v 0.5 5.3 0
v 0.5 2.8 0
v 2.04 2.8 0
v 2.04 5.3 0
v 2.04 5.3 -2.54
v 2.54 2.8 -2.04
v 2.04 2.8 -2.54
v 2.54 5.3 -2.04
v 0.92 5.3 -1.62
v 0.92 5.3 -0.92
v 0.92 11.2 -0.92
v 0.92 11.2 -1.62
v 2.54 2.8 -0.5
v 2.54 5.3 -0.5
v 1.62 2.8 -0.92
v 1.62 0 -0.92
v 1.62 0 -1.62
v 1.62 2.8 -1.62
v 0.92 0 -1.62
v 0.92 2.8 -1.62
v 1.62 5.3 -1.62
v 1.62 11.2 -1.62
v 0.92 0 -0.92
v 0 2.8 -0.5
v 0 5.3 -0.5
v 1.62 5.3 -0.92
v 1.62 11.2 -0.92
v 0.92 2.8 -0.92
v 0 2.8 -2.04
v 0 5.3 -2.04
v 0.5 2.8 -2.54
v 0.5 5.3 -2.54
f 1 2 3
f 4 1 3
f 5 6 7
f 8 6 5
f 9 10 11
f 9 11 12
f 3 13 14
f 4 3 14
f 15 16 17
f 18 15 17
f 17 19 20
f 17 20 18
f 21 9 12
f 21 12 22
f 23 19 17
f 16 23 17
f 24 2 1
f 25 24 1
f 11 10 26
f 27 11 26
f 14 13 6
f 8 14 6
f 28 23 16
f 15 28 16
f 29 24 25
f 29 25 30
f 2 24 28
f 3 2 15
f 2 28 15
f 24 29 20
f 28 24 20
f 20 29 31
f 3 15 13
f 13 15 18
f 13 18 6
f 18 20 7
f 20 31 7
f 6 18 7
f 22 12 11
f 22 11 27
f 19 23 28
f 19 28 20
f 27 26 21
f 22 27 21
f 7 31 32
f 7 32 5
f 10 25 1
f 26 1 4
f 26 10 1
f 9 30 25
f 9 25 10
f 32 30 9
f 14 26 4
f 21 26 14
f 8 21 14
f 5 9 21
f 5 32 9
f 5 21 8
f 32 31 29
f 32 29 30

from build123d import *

# Parameters (mm, degrees)
SKETCH1_W           = 0.7
SKETCH1_H           = 0.7
BOSS_EXTRUDE1_DEPTH = 11.2
BOSS_EXTRUDE2_START = 2.8
SKETCH1_3_W         = 2.54
SKETCH1_3_H         = 2.54
SKETCH1_3_W_2       = 0.7
SKETCH1_3_H_2       = 0.7
BOSS_EXTRUDE2_DEPTH = 2.5
CHAMFER1_SIZE       = 0.5


with BuildPart() as part:
    # Sketch1 → Boss-Extrude1 (new body)
    with BuildSketch(Plane(origin=(0, 0, 0), x_dir=(1, 0, 0), z_dir=(0, 1, 0))):
        with Locations((1.27, 1.27)):
            Rectangle(SKETCH1_W, SKETCH1_H)
    extrude(amount=BOSS_EXTRUDE1_DEPTH)

    # Sketch1<3> → Boss-Extrude2 (add)
    with BuildSketch(Plane(origin=(0, 0, 0), x_dir=(1, 0, 0), z_dir=(0, 1, 0)).offset(BOSS_EXTRUDE2_START)):
        with Locations((1.27, 1.27)):
            Rectangle(SKETCH1_3_W, SKETCH1_3_H)
        with Locations((1.27, 1.27)):
            Rectangle(SKETCH1_3_W_2, SKETCH1_3_H_2, mode=Mode.SUBTRACT)
    extrude(amount=BOSS_EXTRUDE2_DEPTH)

    # Chamfer1
    chamfer1_edges = [part.edges().sort_by_distance(p)[0] for p in [
        (0, 4.05, 0),
        (2.54, 4.05, 0),
        (2.54, 4.05, -2.54),
        (0, 4.05, -2.54),
    ]]
    chamfer(chamfer1_edges, length=CHAMFER1_SIZE)


solid = part.part
